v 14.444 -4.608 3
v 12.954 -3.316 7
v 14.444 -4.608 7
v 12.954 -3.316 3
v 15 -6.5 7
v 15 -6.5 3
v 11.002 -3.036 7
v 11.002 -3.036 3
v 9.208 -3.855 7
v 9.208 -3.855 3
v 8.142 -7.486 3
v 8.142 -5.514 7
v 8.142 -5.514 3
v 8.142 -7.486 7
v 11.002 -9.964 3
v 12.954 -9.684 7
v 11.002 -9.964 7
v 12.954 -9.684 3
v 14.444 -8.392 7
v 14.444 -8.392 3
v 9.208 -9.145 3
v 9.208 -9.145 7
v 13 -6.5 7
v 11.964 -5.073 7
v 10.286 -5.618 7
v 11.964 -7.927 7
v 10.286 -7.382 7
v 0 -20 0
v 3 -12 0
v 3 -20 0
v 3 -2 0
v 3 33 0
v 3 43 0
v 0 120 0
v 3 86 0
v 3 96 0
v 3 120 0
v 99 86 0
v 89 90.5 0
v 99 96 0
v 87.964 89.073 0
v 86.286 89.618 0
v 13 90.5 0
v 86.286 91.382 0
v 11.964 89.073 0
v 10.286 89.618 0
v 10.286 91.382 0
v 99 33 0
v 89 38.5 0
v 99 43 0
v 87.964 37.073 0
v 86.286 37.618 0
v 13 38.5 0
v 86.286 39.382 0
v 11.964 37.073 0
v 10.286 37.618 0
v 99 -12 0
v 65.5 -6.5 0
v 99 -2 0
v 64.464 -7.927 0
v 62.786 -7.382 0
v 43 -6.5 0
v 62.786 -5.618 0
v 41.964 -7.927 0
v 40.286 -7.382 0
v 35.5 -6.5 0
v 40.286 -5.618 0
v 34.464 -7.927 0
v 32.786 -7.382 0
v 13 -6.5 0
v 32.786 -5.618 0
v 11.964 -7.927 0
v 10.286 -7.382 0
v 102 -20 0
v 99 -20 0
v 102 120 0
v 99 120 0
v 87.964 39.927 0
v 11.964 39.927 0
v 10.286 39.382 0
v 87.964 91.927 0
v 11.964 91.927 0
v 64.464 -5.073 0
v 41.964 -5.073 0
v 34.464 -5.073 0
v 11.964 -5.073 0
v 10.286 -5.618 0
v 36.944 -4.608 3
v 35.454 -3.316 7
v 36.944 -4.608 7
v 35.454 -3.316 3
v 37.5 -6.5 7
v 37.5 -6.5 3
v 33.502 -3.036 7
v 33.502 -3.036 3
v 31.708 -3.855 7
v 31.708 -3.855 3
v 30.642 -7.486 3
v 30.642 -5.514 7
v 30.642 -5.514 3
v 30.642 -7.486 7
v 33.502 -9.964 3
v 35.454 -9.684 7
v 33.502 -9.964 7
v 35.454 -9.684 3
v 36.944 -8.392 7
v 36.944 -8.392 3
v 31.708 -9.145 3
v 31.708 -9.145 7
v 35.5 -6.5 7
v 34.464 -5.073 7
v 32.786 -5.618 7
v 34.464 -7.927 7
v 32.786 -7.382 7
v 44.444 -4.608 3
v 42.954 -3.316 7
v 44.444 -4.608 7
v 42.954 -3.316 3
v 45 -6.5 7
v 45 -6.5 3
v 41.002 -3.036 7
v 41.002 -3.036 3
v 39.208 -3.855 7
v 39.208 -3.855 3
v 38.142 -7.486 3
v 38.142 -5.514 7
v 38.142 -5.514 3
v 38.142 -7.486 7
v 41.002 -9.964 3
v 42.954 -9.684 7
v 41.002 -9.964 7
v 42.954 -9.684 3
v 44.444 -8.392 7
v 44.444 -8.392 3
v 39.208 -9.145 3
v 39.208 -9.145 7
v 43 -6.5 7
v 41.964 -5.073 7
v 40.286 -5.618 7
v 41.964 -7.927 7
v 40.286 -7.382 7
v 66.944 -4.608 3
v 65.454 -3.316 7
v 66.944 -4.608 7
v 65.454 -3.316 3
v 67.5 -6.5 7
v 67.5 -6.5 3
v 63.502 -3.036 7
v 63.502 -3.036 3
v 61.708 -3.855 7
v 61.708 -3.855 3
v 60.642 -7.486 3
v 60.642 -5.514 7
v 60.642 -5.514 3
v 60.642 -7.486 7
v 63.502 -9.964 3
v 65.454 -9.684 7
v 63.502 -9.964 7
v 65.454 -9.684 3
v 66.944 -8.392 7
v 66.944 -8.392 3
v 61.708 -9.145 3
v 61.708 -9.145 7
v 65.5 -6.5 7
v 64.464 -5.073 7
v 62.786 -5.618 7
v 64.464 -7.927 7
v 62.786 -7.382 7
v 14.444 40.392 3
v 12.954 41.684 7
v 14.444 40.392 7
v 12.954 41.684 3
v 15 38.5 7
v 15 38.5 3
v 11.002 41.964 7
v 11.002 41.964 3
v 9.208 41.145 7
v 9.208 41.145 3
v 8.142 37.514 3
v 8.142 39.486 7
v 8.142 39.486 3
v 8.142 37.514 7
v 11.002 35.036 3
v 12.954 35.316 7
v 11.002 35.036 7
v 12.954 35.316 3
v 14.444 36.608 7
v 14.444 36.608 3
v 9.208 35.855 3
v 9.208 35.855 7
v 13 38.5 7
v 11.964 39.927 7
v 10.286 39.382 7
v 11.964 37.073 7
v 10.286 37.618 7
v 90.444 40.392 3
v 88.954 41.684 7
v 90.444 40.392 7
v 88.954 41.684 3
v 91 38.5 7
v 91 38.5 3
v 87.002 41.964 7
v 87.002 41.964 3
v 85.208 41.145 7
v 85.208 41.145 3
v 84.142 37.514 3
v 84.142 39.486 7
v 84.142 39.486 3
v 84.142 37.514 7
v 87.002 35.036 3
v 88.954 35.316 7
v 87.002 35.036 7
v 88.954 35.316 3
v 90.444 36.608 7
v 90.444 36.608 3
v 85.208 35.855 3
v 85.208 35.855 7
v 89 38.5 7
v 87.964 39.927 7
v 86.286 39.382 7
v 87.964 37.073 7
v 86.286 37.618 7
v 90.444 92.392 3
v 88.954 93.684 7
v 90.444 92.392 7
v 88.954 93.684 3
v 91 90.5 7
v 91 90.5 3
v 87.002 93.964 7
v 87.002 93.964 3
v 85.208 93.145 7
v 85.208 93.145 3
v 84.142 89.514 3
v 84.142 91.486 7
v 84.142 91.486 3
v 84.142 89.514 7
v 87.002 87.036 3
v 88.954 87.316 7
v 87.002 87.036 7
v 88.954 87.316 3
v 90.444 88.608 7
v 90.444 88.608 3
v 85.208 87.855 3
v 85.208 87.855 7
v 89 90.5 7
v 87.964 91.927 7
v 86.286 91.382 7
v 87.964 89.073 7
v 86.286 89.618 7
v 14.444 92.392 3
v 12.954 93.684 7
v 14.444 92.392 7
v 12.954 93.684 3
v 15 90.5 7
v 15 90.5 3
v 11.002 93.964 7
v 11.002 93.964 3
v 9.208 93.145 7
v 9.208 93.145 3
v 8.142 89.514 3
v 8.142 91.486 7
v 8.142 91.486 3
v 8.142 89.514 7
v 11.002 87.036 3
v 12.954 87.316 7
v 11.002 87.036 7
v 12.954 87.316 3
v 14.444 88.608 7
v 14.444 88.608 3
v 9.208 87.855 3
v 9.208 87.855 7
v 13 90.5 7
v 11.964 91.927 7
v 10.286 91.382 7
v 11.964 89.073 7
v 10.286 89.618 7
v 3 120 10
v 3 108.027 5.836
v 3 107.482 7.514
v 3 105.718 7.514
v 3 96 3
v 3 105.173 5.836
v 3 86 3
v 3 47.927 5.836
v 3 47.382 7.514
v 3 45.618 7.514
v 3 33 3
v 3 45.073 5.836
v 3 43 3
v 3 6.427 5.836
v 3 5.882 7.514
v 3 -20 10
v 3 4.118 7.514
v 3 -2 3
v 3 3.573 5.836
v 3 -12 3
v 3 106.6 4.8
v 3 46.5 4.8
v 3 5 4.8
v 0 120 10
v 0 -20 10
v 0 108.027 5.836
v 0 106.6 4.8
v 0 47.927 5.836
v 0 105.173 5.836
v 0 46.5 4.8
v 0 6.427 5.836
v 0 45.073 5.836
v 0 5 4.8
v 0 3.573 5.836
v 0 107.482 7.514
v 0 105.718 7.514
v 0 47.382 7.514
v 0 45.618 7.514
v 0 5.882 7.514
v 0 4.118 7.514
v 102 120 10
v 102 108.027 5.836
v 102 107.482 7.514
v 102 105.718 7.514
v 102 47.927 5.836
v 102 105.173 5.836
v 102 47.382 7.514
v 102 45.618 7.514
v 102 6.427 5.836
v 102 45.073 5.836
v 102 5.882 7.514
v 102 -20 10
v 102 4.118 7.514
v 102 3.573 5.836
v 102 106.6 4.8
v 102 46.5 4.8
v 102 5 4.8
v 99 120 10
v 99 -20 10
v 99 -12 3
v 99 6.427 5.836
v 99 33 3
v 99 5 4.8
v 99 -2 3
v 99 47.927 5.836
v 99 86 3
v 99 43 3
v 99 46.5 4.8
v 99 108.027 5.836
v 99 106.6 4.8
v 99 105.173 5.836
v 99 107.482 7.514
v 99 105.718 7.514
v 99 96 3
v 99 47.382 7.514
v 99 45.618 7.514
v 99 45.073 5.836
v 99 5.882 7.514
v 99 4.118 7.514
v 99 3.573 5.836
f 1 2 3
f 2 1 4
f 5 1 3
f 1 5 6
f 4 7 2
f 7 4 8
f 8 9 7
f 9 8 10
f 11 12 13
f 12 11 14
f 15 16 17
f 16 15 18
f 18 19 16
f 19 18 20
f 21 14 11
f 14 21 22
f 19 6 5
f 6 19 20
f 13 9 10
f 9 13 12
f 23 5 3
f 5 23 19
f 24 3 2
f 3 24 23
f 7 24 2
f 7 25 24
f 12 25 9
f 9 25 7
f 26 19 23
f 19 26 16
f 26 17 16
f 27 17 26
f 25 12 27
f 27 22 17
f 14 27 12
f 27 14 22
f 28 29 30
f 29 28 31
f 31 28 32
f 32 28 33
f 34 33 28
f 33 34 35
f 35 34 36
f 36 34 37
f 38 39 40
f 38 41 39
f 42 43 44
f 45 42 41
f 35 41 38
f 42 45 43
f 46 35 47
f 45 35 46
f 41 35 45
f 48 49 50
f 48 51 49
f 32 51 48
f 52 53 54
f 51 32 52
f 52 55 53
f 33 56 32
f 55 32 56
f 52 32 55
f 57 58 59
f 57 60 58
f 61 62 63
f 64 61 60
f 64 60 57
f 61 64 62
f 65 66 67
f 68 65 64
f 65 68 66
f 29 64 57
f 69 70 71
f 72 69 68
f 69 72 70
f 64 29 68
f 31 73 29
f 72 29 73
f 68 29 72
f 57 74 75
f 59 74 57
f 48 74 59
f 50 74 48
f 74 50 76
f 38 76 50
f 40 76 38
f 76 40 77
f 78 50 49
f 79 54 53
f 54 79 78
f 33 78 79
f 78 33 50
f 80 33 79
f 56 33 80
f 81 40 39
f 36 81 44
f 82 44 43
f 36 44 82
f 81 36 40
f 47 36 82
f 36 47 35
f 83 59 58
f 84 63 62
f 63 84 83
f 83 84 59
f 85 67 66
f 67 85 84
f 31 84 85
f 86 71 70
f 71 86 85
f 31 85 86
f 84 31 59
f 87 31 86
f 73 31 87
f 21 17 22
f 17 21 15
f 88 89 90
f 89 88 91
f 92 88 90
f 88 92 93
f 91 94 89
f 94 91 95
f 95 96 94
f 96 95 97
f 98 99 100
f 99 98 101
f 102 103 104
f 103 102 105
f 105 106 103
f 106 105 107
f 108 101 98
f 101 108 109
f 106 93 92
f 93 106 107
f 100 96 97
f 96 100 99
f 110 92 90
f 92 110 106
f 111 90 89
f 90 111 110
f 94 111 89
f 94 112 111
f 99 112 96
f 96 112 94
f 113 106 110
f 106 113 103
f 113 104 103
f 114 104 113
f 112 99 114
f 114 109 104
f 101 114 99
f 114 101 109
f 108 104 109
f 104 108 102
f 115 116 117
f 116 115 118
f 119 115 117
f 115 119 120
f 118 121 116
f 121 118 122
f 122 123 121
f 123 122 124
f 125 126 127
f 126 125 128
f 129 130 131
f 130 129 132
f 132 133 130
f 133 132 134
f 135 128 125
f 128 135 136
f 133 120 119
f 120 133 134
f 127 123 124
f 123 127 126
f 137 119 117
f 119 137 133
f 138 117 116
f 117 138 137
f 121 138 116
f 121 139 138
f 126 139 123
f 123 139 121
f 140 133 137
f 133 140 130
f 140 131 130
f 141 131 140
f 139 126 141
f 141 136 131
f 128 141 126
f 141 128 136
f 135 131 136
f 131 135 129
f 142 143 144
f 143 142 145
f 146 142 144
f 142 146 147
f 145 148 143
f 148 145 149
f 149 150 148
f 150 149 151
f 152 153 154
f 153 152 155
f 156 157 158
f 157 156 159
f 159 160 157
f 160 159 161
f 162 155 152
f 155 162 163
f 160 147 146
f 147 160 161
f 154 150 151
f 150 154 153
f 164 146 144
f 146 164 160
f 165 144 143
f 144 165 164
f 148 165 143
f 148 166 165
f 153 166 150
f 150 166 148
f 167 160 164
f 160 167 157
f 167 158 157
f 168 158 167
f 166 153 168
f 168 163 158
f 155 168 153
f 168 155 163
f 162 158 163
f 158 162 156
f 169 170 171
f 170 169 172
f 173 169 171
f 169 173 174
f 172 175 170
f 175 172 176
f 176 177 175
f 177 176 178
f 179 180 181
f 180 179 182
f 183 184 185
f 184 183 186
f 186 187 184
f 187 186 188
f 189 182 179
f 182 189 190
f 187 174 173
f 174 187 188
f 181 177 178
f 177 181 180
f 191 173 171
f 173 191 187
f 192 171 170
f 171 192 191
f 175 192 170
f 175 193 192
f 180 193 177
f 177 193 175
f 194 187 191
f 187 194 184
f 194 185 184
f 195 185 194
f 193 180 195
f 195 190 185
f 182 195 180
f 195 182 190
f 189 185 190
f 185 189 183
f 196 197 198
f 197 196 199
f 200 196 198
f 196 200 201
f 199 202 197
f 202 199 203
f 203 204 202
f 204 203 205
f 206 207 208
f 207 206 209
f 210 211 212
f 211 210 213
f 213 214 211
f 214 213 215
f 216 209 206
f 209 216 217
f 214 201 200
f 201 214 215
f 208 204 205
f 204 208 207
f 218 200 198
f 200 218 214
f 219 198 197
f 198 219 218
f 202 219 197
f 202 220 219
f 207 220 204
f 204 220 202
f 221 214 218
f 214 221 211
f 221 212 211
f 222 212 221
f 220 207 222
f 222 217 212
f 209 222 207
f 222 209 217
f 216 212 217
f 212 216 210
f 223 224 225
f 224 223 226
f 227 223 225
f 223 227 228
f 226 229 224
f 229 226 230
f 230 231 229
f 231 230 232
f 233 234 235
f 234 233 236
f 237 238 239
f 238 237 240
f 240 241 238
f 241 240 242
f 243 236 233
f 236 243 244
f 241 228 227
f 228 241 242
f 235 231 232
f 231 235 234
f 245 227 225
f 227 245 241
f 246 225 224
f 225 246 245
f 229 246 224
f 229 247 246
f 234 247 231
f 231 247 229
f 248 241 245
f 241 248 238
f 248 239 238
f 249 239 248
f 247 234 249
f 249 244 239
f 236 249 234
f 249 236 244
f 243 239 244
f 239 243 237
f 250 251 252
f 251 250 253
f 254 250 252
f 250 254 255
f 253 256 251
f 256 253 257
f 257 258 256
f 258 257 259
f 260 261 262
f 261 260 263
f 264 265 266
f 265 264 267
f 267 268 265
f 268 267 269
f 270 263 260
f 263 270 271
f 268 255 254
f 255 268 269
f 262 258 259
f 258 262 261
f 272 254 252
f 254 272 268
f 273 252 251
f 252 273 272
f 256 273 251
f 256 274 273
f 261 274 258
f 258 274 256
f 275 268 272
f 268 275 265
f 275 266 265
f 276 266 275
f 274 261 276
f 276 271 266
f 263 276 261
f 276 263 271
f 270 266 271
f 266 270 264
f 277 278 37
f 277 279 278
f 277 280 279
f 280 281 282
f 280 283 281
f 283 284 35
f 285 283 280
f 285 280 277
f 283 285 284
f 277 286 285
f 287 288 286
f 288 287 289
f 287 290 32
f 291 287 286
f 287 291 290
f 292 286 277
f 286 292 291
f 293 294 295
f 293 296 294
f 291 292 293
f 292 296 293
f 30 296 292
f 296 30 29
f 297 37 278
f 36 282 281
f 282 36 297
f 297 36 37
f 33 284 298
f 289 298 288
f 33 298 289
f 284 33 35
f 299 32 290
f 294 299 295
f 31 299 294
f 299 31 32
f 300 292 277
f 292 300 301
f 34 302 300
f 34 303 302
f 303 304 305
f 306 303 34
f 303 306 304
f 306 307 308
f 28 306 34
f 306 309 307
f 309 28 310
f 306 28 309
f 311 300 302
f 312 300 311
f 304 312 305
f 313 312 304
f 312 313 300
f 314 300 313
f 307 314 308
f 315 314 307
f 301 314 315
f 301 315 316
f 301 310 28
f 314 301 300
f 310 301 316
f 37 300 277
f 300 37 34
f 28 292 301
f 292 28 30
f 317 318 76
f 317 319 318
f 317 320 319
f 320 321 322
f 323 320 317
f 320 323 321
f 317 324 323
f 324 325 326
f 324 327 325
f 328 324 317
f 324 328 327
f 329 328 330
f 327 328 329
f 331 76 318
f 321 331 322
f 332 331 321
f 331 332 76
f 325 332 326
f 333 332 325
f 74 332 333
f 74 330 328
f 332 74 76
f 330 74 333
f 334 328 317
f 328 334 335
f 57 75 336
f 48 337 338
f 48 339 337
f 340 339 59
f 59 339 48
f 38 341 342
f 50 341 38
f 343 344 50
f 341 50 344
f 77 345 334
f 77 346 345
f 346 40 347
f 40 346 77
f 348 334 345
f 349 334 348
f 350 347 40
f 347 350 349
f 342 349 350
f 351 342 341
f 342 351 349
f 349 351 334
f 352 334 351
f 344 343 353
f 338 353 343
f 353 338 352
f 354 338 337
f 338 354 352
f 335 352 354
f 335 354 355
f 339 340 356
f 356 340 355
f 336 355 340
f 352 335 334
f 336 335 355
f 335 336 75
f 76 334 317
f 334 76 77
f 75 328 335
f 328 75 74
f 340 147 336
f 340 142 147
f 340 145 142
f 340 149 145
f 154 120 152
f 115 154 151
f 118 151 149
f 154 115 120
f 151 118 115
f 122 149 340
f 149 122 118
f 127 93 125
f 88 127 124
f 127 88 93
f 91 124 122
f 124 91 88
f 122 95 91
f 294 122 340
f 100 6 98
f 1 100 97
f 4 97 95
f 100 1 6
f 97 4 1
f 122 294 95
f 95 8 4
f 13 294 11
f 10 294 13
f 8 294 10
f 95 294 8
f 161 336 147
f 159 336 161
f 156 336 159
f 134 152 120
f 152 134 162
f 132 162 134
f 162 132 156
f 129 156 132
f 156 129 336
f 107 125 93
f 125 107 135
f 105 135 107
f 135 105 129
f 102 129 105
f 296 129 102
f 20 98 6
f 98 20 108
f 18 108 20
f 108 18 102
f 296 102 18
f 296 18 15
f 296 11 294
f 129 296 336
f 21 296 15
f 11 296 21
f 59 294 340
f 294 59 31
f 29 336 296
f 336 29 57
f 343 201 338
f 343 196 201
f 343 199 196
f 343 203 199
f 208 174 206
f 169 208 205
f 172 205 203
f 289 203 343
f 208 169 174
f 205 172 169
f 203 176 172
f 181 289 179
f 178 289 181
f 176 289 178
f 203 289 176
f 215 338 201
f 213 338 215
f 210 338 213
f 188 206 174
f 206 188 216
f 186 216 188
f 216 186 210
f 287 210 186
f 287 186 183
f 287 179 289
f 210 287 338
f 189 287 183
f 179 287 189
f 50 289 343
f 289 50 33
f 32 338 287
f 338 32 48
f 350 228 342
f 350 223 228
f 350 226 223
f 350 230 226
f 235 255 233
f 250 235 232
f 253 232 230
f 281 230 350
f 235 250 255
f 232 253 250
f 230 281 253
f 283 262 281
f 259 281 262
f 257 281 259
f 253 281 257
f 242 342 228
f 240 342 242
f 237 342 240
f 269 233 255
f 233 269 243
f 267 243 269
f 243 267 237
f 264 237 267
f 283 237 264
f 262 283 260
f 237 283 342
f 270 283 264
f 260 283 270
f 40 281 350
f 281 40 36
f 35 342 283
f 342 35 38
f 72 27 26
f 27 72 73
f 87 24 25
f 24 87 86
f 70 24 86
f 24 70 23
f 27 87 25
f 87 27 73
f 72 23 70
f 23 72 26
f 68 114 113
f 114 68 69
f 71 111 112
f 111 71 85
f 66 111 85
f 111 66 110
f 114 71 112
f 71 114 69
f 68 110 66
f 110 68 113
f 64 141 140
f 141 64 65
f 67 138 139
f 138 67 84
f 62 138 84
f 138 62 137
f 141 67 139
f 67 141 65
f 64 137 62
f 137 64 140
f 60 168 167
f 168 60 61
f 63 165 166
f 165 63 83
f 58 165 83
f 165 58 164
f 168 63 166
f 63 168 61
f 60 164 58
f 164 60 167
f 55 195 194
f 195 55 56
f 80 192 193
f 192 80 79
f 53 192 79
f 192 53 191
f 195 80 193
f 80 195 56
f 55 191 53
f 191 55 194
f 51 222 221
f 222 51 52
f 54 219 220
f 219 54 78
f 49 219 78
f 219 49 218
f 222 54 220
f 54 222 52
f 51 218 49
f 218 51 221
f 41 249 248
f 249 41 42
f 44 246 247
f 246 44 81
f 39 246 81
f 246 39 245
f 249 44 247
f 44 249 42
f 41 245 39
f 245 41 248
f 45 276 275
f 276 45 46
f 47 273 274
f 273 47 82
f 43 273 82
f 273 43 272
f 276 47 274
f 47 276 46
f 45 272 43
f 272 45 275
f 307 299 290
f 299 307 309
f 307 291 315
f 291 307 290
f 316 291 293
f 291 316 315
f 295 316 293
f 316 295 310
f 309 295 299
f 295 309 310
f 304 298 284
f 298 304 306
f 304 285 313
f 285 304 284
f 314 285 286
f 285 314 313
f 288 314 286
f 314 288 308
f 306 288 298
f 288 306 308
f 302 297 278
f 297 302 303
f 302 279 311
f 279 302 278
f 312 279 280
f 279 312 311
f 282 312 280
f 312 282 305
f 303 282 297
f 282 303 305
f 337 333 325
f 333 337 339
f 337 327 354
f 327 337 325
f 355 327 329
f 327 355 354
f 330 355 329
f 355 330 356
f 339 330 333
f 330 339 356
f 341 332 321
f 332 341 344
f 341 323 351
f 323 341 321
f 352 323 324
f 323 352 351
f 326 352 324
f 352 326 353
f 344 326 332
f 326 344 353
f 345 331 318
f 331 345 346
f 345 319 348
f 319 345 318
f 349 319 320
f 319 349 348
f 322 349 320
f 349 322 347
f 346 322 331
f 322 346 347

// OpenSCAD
th=3; // thickness
ra=4; // raiser
d1=0.01;d2=2*d1;

//translate([140,-40,0]) import("inc/Pi_Drive.stl");
translate([0,-20,0]) {
	difference() {
		union() {
			// side mount
			cube([th,140,10]);
			translate([102-3,0,0]) cube([th,140,10]);
			//
			//cube([th+5,140,th]);
			//
			//#translate([th+3.5+49,22,0]) cube([th,100,3]);
			// 1st
			translate([0, 8,0]) cube([101,10,th]);
			// 2nd
			translate([0,53,0]) cube([101,10,th]);
			// 3rd
			translate([0,106,0]) cube([101,10,th]);
			//
			for (y=[10:100:100]) {
				translate([th+3.5+5,3.5+y,0]) {
					// rpi: 49,58
					// odroid: 52,76
					translate([ 0, 0,0]) cylinder(d=7,h=th+ra);
					translate([22.5, 0,0]) cylinder(d=7,h=th+ra);		
					translate([ 22.5+7.5, 0,0]) cylinder(d=7,h=th+ra);
					translate([22.5+7.5+22.5, 0,0]) cylinder(d=7,h=th+ra);		
				}
			}
			// https://www.raspberrypi.org/blog/introducing-raspberry-pi-model-b-plus/
			// http://www.hardkernel.com/main/products/prdt_info.php?g_code=G143452239825&tab_idx=2
			for (y=[55:100:100]) {
				translate([th+3.5+5,3.5+y,0]) {
					// rpi: 49,58
					// odroid: 52,76
					translate([ 0, 0,0]) cylinder(d=7,h=th+ra);
					translate([76, 0,0]) cylinder(d=7,h=th+ra);		
					translate([76,52,0]) cylinder(d=7,h=th+ra);
					translate([ 0,52,0]) cylinder(d=7,h=th+ra);		
				}
			}
		}
		//		
		#for (y=[10:100:100]) {
			translate([th+3.5+5,3.5+y,0]) {
				translate([ 0, 0,0]) cylinder(d=3,h=th+ra,$fn=5);
				translate([22.5, 0,0]) cylinder(d=3,h=th+ra,$fn=5);		
				translate([ 22.5+7.5, 0,0]) cylinder(d=3,h=th+ra,$fn=5);
				translate([22.5+7.5+22.5, 0,0]) cylinder(d=3,h=th+ra,$fn=5);		
			}
		}
		//		
		for (y=[55:100:100]) {
			translate([th+3.5+5,3.5+y,0]) {
				translate([ 0, 0,0]) cylinder(d=3,h=th+ra,$fn=5);
				translate([76, 0,0]) cylinder(d=3,h=th+ra,$fn=5);		
				translate([76,52,0]) cylinder(d=3,h=th+ra,$fn=5);
				translate([ 0,52,0]) cylinder(d=3,h=th+ra,$fn=5);		
			}
		}
		//
		translate([-d1,25,6.3]) rotate([0,90,0]) cylinder(d=3,h=th+d2,$fn=5);
		translate([-d1,66.5,6.3]) rotate([0,90,0]) cylinder(d=3,h=th+d2,$fn=5);
		translate([-d1,126.6,6.3]) rotate([0,90,0]) cylinder(d=3,h=th+d2,$fn=5);
		//
		translate([102-3-d1,25,6.3]) rotate([0,90,0]) cylinder(d=3,h=th+d2,$fn=5);
		translate([102-3-d1,66.5,6.3]) rotate([0,90,0]) cylinder(d=3,h=th+d2,$fn=5);
		translate([102-3-d1,126.6,6.3]) rotate([0,90,0]) cylinder(d=3,h=th+d2,$fn=5);
	}
}
